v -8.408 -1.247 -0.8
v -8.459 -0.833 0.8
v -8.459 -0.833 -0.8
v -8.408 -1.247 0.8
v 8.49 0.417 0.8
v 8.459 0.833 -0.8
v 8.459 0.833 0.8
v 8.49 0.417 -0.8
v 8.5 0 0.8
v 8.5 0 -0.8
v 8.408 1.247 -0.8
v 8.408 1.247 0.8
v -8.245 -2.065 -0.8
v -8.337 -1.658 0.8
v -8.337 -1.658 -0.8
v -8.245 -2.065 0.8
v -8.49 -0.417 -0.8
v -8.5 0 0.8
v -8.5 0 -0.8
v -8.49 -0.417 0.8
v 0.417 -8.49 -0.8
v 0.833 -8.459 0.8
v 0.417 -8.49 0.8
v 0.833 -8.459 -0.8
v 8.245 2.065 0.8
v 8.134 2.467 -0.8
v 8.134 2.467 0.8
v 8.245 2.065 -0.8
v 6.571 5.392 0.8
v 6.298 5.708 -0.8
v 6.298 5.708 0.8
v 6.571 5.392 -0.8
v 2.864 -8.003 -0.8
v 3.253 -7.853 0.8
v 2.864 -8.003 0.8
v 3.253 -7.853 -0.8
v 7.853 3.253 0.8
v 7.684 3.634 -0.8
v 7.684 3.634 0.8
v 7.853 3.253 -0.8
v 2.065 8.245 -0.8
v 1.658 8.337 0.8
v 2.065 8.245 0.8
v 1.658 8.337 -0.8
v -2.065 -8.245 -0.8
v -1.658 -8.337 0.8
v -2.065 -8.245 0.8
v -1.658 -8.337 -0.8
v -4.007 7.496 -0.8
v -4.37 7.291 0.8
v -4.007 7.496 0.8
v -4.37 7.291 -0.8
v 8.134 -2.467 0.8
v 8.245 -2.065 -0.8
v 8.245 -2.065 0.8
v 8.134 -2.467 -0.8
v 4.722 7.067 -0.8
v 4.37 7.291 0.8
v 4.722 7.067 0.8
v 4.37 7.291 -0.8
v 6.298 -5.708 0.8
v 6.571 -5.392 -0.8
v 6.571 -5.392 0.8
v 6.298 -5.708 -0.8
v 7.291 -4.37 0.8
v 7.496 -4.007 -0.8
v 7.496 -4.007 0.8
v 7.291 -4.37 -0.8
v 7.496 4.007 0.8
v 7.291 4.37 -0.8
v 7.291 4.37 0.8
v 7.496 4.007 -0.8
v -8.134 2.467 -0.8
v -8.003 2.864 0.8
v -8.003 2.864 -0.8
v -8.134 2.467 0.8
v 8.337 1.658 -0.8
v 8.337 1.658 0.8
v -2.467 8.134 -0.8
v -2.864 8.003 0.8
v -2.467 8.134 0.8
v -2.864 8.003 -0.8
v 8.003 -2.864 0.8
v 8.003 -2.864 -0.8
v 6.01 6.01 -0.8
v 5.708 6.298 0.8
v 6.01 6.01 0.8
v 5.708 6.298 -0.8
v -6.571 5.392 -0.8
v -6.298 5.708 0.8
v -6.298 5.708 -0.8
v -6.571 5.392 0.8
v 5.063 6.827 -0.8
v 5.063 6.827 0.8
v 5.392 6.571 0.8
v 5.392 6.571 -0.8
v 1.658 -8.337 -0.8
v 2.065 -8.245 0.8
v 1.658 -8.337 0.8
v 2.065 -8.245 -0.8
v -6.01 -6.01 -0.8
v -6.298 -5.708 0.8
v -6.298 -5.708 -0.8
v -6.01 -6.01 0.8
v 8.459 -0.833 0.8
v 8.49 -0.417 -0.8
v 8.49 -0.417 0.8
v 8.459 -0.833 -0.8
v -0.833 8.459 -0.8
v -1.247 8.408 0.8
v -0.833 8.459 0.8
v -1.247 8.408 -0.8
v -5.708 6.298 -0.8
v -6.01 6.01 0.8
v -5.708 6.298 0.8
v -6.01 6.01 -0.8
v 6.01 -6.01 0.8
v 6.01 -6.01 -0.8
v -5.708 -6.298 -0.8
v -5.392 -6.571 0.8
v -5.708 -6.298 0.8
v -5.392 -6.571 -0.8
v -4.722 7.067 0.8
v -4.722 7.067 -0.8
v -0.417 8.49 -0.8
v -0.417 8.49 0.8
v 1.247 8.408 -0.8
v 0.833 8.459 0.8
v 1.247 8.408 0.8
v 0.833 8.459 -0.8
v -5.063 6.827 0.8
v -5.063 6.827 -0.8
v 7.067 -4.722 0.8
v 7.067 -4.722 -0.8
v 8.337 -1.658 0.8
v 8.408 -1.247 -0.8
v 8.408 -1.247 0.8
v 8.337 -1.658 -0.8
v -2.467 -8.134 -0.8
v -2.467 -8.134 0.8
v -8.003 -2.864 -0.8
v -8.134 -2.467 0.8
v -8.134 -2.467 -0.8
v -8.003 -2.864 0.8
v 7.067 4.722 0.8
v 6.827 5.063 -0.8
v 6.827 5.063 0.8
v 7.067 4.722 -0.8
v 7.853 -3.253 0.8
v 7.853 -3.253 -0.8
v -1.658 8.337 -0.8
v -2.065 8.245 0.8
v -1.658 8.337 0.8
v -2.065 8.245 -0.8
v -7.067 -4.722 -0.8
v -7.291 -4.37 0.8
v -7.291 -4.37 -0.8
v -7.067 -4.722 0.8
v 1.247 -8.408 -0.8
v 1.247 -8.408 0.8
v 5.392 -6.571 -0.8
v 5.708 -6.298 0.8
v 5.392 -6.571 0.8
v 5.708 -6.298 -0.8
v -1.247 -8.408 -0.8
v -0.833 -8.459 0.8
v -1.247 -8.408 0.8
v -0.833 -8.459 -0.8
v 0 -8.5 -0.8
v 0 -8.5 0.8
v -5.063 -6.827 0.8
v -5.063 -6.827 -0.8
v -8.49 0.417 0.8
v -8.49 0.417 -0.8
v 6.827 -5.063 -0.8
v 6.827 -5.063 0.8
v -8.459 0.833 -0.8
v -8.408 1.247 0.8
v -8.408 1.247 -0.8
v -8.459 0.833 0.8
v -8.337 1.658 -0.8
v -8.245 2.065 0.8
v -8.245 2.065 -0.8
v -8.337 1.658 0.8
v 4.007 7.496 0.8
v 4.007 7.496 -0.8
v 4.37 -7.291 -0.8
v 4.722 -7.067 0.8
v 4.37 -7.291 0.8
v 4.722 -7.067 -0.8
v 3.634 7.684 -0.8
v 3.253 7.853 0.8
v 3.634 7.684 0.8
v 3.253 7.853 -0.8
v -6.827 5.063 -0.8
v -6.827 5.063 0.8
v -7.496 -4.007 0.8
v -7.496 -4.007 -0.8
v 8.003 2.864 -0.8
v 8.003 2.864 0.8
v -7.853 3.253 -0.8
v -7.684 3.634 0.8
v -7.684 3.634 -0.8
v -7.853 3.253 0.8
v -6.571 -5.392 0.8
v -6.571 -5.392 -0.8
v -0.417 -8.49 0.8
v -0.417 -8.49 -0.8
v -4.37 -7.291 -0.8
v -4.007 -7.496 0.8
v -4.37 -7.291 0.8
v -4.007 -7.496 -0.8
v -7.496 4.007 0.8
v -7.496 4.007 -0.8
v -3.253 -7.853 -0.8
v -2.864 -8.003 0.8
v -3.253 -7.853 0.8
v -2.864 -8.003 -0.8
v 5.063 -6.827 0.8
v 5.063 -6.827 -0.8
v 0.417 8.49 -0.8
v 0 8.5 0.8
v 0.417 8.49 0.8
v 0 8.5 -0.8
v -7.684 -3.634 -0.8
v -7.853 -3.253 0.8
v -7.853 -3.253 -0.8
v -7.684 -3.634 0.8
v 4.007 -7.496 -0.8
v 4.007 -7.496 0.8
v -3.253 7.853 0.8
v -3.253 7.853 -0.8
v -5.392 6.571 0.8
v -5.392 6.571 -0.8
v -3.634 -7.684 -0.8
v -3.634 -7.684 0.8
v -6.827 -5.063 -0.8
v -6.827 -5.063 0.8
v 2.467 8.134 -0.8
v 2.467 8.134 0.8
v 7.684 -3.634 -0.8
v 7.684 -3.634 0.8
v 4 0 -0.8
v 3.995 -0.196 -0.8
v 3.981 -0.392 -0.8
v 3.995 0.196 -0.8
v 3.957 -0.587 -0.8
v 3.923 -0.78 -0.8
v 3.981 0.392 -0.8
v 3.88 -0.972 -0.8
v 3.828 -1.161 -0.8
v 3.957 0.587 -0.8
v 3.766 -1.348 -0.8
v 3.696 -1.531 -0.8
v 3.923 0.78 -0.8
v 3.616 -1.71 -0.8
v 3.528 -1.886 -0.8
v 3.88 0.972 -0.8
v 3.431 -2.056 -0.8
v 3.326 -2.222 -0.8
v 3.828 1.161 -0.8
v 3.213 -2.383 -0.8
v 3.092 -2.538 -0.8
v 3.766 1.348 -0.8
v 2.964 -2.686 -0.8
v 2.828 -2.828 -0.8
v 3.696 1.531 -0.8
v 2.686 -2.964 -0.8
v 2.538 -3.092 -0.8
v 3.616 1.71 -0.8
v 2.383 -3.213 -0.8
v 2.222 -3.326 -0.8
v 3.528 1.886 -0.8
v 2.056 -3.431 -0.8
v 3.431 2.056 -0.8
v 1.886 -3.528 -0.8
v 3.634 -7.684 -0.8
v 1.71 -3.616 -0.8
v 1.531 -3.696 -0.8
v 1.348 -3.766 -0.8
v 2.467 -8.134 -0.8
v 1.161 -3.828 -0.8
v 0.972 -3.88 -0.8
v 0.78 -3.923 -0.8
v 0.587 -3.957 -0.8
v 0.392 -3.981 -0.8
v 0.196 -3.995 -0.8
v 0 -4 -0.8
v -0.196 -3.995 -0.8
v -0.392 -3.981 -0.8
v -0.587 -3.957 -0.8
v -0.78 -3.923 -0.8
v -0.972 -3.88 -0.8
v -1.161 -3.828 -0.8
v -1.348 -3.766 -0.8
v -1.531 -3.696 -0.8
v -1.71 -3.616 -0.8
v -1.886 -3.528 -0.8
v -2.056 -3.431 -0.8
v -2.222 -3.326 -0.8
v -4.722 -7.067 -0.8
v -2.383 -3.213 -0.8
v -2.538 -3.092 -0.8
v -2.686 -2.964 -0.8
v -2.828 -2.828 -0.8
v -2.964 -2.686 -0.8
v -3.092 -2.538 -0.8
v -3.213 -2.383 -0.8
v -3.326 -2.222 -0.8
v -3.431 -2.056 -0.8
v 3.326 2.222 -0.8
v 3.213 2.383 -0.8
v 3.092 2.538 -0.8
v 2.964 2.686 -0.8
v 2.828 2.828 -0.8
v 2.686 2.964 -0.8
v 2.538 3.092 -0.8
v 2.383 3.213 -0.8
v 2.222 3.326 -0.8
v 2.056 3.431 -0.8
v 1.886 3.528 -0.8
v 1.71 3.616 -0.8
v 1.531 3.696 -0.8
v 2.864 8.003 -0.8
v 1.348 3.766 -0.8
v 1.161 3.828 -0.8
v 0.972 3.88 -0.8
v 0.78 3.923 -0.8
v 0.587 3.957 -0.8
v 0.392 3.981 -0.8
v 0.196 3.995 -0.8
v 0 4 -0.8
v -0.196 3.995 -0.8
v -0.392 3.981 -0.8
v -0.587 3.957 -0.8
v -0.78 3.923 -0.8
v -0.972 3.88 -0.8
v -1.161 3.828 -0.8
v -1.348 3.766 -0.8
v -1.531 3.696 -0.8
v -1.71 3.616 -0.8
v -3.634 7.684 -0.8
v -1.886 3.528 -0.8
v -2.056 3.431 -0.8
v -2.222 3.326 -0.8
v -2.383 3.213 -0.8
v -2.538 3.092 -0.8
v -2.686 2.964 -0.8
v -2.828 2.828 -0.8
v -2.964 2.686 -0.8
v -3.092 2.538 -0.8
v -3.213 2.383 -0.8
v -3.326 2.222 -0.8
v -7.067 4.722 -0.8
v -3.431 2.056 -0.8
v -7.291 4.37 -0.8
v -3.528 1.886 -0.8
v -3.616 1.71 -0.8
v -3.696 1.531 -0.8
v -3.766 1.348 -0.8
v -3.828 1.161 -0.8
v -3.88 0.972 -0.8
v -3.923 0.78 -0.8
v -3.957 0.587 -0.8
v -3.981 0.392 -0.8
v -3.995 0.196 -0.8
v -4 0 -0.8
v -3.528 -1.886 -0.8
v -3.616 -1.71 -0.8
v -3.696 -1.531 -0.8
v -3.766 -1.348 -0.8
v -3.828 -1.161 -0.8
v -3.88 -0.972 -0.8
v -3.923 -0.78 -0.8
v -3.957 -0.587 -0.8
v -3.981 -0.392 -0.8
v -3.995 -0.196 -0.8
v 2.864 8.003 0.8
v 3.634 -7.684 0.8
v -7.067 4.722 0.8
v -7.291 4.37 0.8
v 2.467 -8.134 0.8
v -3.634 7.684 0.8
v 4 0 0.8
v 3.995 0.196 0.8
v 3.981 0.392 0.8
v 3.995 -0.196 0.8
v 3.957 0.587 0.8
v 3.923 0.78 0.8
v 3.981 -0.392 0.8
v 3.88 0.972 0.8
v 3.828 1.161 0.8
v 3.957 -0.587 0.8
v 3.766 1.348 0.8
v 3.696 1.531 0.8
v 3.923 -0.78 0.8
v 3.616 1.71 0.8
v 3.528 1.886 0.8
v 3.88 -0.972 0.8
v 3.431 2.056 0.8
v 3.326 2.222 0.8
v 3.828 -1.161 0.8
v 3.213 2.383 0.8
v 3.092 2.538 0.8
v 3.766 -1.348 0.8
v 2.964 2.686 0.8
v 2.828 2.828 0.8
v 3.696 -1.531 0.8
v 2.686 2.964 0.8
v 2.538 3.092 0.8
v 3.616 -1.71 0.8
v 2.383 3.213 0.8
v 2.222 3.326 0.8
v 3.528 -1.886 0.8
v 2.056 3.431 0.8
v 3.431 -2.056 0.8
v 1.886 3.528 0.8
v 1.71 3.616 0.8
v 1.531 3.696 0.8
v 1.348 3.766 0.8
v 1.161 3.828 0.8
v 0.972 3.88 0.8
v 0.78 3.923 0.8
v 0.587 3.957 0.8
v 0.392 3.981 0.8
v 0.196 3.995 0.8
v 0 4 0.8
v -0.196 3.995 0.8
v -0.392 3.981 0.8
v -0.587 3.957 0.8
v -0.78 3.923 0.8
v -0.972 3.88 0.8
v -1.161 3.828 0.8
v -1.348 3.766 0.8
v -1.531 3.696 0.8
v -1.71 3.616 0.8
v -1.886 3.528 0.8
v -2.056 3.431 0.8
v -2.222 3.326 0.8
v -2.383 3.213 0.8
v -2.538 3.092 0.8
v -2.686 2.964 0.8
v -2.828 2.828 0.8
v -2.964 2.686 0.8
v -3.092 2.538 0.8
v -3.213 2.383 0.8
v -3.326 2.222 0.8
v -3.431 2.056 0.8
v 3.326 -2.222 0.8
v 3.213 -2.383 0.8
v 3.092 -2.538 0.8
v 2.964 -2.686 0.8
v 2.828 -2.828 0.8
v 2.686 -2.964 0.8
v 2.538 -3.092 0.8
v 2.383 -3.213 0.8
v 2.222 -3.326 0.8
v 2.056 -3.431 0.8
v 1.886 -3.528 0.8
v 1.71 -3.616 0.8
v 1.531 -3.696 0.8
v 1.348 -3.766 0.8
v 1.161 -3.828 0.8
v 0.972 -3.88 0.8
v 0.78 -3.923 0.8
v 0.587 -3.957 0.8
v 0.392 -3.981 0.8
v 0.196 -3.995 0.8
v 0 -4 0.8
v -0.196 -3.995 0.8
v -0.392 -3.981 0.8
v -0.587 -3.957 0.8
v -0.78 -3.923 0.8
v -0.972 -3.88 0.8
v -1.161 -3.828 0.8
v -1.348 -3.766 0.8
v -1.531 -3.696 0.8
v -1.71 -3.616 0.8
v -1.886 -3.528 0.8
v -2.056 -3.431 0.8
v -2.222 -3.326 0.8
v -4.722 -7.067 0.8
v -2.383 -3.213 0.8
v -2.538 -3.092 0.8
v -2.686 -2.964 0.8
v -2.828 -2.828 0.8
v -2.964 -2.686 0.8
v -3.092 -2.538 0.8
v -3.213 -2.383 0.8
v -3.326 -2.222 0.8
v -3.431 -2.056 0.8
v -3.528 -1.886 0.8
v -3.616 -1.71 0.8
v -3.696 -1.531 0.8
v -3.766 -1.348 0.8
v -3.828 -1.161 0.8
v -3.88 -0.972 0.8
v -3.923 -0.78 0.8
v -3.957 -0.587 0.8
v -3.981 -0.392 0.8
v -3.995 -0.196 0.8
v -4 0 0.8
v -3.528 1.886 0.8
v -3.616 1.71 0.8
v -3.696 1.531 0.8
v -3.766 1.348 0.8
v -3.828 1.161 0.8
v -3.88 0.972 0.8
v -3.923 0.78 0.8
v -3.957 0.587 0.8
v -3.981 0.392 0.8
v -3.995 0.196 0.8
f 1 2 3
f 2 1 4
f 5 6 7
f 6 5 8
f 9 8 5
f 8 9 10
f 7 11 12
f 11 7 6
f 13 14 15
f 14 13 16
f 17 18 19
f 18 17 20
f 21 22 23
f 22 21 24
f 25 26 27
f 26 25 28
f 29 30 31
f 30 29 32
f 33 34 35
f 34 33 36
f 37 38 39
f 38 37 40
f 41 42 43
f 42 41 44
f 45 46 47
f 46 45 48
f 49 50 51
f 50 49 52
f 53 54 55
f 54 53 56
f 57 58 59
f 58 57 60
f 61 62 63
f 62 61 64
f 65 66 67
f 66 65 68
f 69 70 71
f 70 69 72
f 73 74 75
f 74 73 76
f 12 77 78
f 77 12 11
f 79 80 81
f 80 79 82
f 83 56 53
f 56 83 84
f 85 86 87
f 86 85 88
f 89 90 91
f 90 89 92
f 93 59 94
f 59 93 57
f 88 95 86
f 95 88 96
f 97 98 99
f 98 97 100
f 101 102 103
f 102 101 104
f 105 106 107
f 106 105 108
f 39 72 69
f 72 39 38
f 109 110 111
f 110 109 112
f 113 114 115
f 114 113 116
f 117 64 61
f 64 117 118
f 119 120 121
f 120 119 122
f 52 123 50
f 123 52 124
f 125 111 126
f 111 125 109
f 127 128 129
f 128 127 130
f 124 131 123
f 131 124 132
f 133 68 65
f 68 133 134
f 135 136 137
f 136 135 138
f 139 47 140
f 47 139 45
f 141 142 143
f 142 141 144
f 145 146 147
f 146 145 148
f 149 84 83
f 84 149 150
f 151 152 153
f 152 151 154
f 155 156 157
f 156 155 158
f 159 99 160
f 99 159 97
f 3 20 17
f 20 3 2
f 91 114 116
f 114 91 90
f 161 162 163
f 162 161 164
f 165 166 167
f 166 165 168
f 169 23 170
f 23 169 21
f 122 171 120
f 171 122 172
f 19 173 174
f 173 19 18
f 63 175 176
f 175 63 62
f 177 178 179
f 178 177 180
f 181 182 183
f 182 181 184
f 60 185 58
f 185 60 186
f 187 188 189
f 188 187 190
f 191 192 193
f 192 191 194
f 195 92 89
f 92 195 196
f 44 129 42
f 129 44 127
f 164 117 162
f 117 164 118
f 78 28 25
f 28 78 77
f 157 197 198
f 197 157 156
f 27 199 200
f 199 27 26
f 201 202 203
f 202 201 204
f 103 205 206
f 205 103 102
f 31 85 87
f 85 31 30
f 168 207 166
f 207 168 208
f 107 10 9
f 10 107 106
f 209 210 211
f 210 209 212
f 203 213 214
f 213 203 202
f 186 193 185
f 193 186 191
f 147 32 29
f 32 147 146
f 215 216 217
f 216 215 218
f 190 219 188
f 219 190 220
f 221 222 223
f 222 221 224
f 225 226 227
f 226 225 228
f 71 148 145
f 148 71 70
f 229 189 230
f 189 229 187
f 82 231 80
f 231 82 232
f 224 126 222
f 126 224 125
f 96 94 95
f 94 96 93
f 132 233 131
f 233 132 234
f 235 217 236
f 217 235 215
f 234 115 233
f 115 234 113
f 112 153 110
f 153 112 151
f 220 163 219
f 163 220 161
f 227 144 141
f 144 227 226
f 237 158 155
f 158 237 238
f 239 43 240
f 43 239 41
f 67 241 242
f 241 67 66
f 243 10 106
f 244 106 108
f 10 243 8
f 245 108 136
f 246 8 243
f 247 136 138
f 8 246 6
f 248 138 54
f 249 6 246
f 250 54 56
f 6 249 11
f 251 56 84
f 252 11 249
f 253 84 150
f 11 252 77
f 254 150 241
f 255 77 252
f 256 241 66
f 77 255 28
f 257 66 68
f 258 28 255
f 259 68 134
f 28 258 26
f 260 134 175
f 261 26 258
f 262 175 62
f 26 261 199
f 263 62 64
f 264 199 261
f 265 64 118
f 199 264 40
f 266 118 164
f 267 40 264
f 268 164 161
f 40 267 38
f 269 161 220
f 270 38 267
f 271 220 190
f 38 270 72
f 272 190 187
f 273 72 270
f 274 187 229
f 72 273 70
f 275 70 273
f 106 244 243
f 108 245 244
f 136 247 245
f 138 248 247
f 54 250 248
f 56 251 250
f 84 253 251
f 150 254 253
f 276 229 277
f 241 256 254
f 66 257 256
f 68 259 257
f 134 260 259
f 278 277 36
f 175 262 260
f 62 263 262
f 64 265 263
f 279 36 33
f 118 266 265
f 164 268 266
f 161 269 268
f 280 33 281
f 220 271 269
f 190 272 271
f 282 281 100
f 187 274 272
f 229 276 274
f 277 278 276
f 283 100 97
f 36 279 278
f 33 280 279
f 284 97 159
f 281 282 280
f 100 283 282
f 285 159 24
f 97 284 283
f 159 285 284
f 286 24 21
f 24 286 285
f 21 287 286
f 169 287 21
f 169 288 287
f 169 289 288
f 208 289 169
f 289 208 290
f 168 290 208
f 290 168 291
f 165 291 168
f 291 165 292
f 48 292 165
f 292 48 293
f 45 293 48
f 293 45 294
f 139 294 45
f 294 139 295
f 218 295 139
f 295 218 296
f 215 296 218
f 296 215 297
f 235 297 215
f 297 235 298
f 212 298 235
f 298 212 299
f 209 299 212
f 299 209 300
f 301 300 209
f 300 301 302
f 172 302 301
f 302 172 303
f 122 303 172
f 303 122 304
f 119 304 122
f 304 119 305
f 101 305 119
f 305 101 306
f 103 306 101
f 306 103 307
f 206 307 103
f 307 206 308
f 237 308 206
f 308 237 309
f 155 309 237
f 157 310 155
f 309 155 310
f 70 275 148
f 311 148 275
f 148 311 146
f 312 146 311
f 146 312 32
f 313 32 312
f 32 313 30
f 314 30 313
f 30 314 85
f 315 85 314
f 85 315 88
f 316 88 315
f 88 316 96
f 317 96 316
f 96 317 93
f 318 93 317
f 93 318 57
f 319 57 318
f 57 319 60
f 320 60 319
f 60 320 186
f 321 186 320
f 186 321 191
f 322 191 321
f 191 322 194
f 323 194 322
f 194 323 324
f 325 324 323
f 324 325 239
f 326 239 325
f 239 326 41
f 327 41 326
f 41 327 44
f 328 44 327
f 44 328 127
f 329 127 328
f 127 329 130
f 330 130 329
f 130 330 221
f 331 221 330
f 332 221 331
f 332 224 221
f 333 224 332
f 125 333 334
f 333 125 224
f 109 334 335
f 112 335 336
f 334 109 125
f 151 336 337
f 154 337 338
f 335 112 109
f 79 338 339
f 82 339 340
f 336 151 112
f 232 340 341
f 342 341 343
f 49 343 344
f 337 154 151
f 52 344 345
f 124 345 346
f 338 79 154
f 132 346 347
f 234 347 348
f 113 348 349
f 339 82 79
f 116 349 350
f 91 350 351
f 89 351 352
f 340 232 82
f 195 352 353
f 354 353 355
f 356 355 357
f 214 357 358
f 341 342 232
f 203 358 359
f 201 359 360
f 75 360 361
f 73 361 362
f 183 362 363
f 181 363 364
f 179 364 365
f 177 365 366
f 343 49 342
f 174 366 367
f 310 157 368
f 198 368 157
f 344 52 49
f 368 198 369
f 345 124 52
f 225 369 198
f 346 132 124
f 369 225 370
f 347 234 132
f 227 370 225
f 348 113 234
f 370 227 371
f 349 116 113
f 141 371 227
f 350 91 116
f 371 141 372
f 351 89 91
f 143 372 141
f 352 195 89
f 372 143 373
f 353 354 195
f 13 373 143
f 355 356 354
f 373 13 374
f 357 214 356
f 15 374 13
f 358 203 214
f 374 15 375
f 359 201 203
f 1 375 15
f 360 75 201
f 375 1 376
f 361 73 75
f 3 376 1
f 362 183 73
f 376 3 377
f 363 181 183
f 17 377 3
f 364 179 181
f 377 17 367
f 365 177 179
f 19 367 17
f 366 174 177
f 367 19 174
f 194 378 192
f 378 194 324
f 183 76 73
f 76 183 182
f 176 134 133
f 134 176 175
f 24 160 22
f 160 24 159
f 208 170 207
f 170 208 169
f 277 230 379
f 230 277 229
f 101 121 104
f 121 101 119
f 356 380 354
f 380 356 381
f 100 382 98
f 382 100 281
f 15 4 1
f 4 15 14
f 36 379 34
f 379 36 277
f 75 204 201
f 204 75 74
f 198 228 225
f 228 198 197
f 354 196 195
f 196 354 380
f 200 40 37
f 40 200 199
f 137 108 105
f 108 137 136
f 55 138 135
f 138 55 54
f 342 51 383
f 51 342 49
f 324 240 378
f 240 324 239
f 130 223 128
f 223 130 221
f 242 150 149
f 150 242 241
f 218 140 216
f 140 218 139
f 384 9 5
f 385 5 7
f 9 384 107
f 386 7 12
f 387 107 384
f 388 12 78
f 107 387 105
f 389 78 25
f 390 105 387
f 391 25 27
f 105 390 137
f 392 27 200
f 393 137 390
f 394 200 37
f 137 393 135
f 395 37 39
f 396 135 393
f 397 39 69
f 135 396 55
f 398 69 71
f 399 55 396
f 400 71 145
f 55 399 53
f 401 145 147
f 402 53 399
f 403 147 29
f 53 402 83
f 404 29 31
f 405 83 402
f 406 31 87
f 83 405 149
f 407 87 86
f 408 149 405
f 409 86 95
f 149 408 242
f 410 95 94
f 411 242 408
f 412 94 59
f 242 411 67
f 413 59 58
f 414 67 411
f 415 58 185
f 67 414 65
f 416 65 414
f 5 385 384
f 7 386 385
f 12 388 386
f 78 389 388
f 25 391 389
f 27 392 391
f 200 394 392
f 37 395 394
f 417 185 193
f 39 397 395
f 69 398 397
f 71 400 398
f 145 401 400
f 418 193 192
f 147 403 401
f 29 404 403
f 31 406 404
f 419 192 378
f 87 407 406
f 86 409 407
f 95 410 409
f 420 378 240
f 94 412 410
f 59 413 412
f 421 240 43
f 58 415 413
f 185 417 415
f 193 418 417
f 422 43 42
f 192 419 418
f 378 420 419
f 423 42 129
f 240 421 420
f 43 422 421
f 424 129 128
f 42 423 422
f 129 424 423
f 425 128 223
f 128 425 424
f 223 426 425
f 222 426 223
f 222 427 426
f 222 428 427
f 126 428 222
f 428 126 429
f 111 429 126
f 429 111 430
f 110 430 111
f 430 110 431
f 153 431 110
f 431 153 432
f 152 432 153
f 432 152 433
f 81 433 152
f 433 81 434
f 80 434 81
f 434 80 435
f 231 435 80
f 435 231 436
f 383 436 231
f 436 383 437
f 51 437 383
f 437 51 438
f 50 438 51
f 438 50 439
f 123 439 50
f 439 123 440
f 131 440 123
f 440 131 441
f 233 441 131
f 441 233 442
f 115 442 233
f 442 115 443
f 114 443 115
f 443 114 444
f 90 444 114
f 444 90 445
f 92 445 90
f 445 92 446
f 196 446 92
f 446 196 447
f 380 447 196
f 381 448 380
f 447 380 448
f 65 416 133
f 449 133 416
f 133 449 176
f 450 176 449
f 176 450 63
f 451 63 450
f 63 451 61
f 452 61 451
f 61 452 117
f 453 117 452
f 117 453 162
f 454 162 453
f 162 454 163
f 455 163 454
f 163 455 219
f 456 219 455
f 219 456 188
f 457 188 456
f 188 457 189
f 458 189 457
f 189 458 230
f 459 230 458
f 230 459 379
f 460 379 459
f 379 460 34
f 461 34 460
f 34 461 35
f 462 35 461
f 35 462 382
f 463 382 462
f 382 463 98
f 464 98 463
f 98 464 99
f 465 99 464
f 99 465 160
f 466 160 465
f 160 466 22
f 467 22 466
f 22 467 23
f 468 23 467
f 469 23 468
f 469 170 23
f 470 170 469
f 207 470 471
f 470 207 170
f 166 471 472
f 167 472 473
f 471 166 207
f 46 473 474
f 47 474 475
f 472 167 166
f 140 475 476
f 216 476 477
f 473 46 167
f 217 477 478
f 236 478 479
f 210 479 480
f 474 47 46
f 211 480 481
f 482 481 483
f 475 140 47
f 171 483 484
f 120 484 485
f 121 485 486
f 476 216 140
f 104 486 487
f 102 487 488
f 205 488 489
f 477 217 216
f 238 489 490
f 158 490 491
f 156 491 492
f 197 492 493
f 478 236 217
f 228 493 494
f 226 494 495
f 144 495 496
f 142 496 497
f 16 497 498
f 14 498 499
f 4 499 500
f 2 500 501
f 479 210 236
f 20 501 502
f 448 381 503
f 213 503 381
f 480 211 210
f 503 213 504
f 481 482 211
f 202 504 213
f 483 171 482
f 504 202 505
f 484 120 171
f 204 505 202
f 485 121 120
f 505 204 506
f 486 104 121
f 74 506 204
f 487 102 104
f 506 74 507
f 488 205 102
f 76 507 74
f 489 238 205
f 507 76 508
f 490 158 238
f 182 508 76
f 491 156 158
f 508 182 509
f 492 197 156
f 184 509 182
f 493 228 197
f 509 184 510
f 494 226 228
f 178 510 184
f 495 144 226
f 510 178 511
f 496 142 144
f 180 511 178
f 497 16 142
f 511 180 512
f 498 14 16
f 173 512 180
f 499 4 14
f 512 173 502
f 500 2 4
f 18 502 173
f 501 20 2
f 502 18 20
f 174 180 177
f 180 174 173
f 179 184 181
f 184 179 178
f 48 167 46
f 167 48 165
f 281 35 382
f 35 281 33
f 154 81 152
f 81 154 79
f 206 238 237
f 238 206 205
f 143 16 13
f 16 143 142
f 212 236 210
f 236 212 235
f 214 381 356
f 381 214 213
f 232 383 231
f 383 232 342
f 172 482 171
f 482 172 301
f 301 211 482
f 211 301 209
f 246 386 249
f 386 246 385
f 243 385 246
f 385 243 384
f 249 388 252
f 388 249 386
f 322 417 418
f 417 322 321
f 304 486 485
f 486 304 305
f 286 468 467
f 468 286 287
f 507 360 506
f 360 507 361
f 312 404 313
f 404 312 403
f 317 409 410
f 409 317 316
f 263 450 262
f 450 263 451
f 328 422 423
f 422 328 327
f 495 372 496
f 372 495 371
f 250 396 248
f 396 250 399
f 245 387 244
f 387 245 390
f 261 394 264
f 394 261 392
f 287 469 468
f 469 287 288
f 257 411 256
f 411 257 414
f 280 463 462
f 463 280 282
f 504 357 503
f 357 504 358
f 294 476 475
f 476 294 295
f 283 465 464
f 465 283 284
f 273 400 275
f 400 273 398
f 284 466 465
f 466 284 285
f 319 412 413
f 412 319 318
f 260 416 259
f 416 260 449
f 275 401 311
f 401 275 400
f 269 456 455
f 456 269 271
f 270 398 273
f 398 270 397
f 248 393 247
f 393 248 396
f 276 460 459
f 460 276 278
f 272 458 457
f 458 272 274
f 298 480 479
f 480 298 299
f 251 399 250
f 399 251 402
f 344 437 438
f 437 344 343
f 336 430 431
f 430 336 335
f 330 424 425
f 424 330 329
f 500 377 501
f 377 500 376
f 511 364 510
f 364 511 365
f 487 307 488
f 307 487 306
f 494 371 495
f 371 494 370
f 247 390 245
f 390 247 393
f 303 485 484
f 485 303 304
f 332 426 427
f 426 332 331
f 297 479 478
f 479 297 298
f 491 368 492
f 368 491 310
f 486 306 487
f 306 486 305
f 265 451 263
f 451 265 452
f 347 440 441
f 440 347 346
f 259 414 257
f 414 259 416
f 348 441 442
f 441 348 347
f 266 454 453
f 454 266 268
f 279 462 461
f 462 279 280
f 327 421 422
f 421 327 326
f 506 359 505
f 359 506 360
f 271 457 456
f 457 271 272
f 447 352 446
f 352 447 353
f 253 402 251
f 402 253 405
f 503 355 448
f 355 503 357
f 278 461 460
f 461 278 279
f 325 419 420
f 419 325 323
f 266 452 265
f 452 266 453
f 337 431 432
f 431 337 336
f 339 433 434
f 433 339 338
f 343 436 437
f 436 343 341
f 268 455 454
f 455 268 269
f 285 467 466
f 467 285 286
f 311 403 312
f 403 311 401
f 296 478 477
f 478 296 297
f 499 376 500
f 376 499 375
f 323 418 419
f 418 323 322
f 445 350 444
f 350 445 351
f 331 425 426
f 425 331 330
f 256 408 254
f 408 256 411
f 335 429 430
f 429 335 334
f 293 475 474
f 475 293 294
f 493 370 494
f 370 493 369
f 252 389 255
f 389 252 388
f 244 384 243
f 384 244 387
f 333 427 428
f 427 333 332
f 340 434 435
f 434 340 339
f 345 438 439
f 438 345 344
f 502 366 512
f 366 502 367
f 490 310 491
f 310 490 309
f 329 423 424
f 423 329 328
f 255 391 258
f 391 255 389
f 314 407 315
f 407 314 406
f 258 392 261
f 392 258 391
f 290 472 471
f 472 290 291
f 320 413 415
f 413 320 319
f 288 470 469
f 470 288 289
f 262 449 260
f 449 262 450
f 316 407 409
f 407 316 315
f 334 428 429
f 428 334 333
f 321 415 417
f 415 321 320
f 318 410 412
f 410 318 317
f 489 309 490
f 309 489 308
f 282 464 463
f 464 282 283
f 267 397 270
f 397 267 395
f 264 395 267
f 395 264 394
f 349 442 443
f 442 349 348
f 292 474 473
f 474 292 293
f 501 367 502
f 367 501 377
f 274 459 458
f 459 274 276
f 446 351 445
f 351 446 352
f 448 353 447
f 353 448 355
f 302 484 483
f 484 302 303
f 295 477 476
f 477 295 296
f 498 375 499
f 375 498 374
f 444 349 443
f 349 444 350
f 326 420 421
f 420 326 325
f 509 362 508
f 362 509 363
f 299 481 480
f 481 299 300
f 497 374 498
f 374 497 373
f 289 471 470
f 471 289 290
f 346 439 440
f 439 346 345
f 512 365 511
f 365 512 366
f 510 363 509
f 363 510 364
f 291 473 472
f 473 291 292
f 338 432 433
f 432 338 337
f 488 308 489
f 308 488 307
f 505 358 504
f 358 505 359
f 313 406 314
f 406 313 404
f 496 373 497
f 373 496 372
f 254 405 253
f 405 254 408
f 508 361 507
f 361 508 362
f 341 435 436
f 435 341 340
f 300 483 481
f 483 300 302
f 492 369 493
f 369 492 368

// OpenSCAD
$fn=128;

module washer(id=8.0, od=17.0, thickness=1.6) {
    difference() {
        cylinder(h=thickness, d=od, center=true);
        cylinder(h=thickness+0.2, d=id, center=true);
    }
}

washer();
